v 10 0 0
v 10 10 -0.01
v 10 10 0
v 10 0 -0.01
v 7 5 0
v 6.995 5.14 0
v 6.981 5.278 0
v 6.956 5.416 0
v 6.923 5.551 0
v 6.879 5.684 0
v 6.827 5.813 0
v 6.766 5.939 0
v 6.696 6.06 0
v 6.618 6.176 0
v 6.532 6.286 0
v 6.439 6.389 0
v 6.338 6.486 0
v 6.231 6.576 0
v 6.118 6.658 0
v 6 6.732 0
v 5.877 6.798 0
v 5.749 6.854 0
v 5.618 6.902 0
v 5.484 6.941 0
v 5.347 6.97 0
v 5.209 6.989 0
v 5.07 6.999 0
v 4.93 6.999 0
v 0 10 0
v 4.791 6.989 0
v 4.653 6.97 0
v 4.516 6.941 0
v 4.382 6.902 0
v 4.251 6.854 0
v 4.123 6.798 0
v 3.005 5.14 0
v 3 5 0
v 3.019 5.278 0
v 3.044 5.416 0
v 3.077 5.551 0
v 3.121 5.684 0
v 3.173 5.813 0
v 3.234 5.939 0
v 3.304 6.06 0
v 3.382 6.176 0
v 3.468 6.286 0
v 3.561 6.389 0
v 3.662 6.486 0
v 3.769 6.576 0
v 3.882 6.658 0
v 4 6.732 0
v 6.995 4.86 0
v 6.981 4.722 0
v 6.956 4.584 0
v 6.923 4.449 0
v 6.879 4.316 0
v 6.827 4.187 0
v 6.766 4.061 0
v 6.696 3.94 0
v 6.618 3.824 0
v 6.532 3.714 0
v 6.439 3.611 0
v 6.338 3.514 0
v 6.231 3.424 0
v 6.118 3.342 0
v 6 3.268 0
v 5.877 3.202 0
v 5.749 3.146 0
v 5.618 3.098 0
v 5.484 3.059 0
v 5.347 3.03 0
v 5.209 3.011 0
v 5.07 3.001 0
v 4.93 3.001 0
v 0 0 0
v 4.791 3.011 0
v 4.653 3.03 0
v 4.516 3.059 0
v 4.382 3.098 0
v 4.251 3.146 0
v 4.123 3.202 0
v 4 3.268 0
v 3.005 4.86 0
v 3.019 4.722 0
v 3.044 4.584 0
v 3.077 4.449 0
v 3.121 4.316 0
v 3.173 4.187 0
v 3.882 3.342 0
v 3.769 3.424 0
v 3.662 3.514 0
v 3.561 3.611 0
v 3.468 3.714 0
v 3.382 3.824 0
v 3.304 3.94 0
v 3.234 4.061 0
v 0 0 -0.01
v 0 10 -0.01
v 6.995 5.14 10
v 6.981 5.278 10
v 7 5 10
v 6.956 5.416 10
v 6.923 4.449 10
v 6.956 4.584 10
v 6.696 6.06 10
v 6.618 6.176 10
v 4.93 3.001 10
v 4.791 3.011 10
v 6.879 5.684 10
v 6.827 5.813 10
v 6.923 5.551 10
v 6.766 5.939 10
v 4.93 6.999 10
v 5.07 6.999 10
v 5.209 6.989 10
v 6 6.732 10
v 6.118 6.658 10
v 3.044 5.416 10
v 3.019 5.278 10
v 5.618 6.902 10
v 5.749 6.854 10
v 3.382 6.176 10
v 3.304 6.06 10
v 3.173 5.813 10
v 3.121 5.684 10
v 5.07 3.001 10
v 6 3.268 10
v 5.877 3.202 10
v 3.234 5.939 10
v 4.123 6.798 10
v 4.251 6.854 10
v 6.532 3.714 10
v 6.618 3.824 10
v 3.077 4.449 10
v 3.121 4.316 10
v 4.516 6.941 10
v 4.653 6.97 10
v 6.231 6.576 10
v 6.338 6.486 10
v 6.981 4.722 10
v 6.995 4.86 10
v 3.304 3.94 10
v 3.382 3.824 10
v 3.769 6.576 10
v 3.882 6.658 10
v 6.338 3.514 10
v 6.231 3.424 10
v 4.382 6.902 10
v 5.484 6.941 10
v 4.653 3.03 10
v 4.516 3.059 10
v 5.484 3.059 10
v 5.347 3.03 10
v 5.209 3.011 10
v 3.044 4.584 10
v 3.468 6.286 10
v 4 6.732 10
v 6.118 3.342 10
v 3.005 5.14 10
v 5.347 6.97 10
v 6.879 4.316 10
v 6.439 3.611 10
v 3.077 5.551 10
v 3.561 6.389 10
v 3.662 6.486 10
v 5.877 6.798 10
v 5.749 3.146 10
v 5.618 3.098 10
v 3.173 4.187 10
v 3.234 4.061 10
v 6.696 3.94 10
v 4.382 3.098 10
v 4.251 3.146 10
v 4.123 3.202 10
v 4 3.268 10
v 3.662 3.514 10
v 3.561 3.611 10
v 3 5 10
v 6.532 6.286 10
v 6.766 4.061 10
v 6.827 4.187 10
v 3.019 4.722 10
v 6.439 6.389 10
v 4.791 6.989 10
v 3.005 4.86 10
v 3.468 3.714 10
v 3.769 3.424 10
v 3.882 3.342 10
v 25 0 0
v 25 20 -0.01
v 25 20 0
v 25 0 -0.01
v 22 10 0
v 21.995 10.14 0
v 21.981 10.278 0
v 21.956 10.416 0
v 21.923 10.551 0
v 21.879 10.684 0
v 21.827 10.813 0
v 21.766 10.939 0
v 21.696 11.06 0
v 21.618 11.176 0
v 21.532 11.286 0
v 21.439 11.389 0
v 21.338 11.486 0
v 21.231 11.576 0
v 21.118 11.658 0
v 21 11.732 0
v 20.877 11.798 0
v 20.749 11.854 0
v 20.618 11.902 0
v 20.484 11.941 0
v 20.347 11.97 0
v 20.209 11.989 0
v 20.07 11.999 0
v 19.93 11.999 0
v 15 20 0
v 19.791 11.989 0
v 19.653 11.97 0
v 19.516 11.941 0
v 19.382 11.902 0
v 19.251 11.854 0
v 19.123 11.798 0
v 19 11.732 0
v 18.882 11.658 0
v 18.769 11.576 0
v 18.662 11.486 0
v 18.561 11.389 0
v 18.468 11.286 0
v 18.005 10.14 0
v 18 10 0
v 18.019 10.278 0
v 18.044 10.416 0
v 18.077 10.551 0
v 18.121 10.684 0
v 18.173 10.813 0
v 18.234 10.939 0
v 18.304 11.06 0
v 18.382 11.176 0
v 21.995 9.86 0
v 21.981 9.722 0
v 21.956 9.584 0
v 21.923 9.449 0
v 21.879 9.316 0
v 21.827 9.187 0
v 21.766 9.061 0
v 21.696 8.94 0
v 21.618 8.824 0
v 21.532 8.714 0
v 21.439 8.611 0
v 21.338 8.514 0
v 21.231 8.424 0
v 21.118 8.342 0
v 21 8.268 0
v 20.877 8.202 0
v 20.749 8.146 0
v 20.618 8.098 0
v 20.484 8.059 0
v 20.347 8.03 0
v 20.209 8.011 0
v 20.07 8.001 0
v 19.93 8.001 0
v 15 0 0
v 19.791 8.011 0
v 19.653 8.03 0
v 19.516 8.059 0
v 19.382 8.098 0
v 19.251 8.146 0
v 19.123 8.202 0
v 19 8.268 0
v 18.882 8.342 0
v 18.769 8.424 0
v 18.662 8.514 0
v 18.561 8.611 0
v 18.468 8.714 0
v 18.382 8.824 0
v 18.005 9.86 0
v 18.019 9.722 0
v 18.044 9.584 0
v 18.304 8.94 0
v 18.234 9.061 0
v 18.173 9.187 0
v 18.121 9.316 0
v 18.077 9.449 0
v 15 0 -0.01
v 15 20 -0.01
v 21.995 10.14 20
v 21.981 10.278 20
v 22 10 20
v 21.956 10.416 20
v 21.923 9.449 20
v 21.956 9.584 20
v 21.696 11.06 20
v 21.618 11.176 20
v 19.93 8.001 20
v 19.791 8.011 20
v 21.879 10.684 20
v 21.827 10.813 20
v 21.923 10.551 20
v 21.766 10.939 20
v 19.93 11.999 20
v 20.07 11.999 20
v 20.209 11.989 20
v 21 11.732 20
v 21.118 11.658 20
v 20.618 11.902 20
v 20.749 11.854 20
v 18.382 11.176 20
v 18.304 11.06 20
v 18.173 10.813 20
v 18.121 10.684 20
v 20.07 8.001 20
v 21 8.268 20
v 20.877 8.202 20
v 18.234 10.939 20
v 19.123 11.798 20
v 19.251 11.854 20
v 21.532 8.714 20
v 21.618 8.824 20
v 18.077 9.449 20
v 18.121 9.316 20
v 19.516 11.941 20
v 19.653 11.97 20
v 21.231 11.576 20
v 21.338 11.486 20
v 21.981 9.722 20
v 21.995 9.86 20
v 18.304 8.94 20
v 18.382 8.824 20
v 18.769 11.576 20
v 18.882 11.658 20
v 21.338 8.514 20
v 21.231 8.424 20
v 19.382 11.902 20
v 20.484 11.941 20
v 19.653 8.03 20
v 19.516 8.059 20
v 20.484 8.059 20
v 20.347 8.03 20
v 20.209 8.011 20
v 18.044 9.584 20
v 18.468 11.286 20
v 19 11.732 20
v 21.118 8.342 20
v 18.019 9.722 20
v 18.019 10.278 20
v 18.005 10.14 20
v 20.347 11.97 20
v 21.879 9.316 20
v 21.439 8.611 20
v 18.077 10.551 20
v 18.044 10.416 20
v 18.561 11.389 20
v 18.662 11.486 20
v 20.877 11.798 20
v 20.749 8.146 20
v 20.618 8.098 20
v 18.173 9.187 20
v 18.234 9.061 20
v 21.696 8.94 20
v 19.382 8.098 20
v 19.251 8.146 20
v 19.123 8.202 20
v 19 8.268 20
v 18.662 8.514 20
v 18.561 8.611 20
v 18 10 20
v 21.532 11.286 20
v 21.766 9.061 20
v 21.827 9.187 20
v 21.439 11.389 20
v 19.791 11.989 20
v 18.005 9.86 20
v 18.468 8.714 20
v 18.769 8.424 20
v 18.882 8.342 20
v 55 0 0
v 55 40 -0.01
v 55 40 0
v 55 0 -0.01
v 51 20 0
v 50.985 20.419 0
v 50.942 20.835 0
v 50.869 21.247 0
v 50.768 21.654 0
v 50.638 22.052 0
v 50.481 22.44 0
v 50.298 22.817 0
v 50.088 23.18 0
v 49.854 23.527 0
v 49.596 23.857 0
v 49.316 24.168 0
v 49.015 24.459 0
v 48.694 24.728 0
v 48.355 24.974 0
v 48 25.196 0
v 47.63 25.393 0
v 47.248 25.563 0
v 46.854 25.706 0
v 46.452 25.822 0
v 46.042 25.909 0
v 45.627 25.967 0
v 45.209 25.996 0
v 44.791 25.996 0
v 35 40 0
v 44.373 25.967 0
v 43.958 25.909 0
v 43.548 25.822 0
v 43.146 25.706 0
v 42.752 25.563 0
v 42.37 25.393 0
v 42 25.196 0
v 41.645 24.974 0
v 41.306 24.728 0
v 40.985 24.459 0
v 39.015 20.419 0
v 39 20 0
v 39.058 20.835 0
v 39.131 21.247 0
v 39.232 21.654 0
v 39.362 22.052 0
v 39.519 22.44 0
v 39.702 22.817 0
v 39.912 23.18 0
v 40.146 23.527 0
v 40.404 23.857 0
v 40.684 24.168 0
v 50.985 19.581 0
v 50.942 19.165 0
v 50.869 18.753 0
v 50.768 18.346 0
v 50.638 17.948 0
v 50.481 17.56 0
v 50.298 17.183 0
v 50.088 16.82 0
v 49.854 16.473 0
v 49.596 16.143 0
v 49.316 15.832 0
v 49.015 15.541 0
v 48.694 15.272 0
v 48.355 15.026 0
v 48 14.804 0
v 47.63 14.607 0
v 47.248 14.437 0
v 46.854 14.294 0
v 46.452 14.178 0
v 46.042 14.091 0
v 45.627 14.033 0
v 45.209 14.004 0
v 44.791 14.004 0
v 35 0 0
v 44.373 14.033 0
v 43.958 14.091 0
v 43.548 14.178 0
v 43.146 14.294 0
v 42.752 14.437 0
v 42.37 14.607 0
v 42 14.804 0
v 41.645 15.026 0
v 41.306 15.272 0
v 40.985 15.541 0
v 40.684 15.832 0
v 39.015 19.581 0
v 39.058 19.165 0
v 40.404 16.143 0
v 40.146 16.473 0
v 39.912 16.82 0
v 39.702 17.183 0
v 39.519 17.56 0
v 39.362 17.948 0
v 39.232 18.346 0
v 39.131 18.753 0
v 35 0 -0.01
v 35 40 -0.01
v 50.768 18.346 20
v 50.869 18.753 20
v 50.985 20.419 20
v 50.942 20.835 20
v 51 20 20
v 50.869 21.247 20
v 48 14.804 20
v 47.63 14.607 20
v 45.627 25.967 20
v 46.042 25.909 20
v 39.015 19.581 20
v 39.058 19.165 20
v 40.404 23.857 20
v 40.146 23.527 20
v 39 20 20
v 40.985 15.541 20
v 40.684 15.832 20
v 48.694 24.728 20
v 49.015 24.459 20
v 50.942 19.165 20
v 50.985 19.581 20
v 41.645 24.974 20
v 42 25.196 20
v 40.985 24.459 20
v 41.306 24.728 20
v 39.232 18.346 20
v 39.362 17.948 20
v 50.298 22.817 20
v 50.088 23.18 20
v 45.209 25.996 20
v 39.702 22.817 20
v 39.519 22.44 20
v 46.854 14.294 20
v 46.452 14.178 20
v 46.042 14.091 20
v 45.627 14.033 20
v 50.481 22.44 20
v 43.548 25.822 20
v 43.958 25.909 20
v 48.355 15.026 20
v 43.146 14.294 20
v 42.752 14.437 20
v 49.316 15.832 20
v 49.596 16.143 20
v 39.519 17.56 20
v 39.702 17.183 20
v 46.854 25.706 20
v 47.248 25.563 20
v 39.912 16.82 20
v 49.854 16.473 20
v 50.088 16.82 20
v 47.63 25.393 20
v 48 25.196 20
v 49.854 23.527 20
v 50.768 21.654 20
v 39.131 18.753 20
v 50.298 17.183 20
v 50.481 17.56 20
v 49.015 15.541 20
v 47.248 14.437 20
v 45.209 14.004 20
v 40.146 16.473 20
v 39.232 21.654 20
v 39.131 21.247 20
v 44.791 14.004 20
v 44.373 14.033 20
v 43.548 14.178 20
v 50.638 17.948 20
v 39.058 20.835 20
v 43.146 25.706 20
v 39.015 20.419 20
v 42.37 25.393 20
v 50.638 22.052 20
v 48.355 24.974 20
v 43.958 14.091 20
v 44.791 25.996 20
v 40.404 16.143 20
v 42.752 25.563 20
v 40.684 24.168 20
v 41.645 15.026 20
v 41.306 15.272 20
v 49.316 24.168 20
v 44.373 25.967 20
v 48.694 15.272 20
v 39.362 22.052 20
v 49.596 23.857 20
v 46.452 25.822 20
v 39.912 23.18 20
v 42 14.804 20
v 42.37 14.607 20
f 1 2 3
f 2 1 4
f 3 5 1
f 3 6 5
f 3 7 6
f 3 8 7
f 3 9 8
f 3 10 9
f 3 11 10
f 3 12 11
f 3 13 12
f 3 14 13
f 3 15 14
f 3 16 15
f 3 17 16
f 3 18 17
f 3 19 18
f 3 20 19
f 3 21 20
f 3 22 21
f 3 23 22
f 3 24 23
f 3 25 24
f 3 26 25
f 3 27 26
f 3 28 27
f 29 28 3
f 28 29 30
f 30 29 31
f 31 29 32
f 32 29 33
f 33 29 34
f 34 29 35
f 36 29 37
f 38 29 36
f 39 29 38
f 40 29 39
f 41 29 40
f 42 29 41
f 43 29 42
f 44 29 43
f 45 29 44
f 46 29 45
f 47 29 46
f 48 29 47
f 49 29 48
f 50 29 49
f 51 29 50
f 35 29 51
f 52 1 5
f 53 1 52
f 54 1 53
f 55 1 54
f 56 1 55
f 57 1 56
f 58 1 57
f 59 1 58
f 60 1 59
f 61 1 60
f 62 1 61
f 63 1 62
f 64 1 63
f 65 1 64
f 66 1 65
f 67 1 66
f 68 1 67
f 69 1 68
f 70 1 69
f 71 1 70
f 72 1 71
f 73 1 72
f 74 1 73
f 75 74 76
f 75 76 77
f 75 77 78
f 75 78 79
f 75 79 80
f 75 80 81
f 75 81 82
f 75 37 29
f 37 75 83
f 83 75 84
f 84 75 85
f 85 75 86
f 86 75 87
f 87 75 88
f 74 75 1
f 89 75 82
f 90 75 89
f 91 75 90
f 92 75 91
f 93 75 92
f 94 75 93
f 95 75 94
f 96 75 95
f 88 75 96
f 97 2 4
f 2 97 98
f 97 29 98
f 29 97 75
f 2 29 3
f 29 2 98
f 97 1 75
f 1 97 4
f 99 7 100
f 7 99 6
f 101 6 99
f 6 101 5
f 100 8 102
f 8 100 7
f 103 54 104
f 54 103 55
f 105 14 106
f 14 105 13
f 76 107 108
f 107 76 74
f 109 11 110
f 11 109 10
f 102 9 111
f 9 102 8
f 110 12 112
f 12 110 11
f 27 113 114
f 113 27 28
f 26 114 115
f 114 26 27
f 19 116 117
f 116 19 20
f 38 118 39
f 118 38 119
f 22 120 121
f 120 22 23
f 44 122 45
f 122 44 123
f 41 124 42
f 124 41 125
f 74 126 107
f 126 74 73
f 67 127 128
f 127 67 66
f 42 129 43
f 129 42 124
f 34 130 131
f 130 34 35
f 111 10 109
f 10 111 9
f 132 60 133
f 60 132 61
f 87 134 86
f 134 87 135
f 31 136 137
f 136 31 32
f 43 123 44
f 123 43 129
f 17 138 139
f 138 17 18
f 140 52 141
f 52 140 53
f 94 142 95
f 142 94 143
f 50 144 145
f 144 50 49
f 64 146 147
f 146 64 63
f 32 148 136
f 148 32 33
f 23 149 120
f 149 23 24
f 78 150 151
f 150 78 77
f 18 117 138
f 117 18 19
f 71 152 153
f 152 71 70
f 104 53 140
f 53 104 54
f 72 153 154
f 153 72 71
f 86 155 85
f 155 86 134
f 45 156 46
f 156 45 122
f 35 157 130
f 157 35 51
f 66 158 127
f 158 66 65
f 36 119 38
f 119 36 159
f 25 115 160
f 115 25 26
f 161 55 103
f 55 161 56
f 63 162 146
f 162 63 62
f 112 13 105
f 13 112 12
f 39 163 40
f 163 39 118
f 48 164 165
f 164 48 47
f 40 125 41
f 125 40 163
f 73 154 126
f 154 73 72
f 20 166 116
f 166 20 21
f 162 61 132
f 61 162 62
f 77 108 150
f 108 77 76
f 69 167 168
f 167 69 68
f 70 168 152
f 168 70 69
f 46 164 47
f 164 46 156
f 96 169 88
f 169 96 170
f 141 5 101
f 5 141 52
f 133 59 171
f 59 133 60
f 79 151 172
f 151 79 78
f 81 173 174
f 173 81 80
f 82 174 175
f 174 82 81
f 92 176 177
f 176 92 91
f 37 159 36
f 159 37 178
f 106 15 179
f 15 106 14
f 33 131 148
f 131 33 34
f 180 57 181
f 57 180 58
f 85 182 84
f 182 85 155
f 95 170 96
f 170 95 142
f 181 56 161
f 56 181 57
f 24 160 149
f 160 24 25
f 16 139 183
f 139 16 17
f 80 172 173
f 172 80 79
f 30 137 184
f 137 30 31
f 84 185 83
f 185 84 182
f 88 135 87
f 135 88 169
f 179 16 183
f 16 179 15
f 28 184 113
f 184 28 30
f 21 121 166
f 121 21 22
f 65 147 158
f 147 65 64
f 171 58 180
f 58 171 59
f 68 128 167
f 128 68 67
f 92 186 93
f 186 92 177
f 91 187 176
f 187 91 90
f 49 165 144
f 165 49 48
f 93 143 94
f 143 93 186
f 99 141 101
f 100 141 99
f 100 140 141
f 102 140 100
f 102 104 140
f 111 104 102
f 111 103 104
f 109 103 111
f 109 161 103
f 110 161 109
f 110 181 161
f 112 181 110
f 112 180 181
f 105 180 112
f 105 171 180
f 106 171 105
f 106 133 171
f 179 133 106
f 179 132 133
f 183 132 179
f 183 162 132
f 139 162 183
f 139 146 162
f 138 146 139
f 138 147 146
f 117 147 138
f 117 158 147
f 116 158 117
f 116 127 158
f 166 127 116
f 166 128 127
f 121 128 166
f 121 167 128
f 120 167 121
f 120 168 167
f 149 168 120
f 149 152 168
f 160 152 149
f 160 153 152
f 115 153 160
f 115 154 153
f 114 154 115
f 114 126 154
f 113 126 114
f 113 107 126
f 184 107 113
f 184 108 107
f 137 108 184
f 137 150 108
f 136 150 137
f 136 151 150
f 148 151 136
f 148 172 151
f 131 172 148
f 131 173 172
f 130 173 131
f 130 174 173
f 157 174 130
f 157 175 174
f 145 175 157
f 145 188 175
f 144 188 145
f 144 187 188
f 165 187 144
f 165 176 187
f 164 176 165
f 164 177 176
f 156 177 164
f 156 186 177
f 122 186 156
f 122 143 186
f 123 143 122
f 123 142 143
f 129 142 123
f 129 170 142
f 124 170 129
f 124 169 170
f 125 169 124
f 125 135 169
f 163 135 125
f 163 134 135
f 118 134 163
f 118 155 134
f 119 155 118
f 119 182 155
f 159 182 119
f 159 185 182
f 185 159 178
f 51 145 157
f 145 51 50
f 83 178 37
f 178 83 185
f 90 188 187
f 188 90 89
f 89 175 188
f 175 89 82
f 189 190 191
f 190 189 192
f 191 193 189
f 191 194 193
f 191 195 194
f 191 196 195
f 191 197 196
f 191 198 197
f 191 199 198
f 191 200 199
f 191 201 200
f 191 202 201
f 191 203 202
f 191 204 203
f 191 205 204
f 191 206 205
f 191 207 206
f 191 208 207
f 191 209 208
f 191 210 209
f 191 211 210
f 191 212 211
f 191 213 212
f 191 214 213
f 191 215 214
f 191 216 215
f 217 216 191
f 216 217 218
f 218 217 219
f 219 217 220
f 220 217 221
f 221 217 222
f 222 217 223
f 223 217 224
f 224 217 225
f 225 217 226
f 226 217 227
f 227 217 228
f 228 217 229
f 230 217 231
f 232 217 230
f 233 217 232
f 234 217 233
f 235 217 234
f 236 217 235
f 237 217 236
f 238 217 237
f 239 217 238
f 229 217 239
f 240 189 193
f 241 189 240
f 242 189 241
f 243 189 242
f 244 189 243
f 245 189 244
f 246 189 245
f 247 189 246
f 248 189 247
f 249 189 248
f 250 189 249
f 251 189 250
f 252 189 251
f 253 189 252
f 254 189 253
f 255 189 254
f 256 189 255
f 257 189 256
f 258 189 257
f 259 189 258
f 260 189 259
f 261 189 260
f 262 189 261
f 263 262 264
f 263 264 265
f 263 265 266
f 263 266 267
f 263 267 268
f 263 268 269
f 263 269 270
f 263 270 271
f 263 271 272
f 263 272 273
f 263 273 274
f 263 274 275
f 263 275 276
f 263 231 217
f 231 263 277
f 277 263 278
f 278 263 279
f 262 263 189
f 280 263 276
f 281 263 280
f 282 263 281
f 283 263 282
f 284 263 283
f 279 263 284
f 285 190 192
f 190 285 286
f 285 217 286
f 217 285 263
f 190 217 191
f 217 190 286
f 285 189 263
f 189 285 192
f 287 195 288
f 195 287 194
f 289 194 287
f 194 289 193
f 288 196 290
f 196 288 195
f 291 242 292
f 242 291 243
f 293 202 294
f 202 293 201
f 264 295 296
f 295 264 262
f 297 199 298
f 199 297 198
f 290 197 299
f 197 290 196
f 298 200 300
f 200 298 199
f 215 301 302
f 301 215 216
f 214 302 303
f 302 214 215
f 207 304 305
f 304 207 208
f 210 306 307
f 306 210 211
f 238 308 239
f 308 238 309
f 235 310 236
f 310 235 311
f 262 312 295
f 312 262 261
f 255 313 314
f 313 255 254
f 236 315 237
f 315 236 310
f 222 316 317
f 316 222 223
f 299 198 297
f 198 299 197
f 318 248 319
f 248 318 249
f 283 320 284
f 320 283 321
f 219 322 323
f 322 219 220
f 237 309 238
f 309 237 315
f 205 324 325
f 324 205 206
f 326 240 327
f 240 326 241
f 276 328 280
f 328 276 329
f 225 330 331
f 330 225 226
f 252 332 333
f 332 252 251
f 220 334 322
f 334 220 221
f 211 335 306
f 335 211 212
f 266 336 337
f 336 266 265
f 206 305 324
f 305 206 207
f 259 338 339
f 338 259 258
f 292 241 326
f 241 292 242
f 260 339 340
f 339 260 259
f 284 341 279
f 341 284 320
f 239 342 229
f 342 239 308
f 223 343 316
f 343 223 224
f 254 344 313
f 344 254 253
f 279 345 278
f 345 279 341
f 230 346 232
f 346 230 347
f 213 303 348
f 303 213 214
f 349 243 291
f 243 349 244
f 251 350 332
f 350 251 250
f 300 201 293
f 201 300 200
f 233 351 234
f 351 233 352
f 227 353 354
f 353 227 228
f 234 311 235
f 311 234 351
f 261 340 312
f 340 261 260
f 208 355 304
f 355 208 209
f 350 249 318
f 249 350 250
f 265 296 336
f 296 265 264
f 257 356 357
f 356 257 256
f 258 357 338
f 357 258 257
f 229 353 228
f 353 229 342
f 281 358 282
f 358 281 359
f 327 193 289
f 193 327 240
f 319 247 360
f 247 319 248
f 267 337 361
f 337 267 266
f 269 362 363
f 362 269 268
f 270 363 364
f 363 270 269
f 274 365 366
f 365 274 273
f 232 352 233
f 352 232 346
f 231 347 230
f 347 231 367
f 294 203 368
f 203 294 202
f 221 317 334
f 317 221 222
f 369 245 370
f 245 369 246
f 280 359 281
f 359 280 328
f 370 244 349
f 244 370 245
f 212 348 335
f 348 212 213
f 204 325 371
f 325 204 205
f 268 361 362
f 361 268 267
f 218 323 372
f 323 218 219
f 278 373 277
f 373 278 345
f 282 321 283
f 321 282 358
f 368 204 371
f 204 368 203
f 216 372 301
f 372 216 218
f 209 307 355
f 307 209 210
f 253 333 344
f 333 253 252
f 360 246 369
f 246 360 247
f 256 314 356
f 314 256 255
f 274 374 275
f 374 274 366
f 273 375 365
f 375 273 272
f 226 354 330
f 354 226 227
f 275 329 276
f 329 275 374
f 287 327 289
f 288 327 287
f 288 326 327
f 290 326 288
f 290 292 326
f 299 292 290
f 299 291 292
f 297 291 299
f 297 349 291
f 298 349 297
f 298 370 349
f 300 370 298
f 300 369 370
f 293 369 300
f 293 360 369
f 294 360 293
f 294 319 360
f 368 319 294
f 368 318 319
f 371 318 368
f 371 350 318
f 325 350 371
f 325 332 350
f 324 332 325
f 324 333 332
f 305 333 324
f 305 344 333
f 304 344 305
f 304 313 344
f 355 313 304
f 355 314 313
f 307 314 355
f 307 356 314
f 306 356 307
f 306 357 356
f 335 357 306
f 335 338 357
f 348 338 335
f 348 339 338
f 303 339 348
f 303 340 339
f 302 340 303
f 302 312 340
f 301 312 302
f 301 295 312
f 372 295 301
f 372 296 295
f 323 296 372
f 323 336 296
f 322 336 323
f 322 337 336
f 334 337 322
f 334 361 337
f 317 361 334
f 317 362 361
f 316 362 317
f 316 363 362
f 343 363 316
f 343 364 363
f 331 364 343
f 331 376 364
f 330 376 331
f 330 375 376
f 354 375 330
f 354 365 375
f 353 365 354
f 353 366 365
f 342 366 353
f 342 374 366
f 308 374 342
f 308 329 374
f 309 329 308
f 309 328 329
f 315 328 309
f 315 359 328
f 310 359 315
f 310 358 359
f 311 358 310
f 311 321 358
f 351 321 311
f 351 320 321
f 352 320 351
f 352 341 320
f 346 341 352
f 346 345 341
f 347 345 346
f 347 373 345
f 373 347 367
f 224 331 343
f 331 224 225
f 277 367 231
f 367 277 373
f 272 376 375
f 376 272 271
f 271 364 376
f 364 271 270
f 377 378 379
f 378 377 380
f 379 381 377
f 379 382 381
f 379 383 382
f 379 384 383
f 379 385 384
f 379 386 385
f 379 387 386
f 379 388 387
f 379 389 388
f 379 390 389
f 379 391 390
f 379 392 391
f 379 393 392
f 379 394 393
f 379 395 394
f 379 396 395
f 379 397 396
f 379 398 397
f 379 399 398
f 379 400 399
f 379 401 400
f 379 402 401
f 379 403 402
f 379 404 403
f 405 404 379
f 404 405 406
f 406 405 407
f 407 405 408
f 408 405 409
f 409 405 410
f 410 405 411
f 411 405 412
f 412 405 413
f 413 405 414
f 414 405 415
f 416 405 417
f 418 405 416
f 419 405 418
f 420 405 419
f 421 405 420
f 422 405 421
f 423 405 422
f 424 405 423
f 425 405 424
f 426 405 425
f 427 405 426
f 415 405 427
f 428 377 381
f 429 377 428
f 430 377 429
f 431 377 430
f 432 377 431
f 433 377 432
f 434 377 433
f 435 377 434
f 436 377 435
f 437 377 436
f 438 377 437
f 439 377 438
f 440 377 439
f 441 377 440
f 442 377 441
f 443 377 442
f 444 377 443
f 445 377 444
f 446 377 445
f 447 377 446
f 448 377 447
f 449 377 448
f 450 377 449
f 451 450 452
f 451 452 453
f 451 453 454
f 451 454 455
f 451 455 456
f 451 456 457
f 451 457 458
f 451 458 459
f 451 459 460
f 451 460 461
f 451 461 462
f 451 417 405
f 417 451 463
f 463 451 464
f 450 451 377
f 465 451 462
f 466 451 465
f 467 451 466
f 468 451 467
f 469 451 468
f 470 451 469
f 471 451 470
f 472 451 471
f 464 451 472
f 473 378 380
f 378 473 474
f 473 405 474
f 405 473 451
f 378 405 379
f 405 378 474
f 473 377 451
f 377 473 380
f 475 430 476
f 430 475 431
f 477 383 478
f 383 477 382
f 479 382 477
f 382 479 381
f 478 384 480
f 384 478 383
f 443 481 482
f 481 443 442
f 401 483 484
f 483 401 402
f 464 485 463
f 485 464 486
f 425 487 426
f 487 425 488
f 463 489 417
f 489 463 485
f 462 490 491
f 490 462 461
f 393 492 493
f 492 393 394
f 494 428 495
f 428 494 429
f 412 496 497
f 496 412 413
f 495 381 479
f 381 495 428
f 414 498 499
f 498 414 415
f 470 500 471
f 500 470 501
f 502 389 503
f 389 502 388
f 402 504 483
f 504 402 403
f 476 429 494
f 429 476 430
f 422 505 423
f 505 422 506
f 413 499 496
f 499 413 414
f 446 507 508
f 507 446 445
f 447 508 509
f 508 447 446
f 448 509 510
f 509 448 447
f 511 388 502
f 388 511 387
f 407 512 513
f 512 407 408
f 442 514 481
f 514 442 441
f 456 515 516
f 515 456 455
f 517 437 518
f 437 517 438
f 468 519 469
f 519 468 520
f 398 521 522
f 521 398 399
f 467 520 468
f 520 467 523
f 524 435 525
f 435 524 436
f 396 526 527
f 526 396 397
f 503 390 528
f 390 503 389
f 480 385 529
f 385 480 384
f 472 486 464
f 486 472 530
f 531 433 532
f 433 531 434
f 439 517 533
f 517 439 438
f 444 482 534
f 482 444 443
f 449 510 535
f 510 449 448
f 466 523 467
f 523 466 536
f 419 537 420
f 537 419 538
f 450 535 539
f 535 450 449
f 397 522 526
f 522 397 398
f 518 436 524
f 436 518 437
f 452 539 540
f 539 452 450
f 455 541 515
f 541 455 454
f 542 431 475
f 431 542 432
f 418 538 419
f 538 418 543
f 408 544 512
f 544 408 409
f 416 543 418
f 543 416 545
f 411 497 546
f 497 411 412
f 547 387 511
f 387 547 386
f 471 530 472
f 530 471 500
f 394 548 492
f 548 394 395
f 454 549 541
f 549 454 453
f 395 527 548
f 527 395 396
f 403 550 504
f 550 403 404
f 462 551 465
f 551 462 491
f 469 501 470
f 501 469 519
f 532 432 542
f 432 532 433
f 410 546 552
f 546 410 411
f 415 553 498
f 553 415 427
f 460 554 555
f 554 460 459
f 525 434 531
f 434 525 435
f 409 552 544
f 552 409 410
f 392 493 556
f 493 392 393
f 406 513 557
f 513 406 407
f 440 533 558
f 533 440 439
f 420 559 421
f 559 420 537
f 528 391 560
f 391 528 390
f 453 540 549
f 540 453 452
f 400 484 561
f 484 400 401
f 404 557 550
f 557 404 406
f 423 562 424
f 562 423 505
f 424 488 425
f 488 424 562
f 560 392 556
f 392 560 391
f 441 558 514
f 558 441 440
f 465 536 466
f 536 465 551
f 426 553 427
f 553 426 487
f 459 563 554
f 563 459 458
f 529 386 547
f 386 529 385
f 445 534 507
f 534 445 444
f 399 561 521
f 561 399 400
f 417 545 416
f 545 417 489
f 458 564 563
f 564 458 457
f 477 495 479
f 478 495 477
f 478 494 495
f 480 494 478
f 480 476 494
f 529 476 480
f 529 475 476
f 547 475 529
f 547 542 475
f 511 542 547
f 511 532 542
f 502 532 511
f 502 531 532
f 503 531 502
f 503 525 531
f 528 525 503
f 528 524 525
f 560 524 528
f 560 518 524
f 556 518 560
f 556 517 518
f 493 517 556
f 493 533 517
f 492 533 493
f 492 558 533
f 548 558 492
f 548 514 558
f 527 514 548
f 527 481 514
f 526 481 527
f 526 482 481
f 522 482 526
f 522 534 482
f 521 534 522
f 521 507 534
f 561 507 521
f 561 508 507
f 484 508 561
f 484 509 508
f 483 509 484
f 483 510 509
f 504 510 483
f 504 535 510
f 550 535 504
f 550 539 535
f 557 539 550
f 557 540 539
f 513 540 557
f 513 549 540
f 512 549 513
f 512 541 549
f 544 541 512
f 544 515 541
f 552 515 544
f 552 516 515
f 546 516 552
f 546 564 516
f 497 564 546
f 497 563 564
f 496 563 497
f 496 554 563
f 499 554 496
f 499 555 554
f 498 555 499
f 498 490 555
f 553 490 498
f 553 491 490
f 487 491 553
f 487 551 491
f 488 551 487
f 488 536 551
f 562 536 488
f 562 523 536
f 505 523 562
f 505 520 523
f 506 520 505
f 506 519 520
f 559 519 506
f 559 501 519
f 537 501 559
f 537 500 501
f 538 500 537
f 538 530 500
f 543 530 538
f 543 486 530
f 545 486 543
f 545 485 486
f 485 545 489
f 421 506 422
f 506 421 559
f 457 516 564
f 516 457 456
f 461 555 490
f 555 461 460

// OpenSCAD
// file: ../../Base/Boxes.scad
// Fischertechnik Box Foundation
// Pre-designed Boxes

use <Constants.scad>

include <PlacementOptions.scad>

box190Width = 190;
box190Depth = 130;
box130Width = 130;
box130Depth = 95;
boxUsageHeight = 33.9;
boxWallThickness = 2.4;
boxBaseThickness = 1.0;

// getBoxWallThickness()
// Gets the wall thickness of a Fischertechnik Box

function getBoxWallThickness() = boxWallThickness;

// Gets the usable height of a fischertechnik box
function getBoxUsageHeight() = boxUsageHeight;

// Gets the thickness of the Fischertechnik box base.
function getBoxBaseThickness() = boxBaseThickness;

// Gets the usable inner space of a Box 190 as an x/y-list
function getBox190Space() = [
    box190Width - 2*getBoxWallThickness(), 
    box190Depth - 2*getBoxWallThickness() ];

// Imports the Fischertechnik empty box 130x190 mm and places it at position 0,0
// 190x130 are the outer sizes, the inner space is slightly smaller. Use getBox190Space() to get the inner sizes.
// This module needs the STL file "Fischertechnik Box 130x190.stl" in the library path.
// The box is positioned that the usable inner space is at the 0,0,0 position. The

module Box190() {
    translate([-getBoxWallThickness(),-getBoxWallThickness(),-getBoxBaseThickness()])
        import("Fischertechnik Box 130x190.stl", convexity=3);
}

// Gets the usable inner space of a Box 130 as an x/y-list
function getBox130Space() = [
    box130Width - 2*getBoxWallThickness(), 
    box130Depth - 2*getBoxWallThickness() ];

// Imports the Fischertechnik empty box 95x130 mm and places it at position 0,0
// 190x130 are the outer sizes, the inner space is slightly smaller. Use getBox190Space() to get the inner sizes.
// This module needs the STL file "Fischertechnik Box 95x130.stl" in the library path.
// The box is positioned that the usable inner space is at the 0,0,0 position. The

module Box130() {
    translate([-getBoxWallThickness(),-getBoxWallThickness(),-getBoxBaseThickness()])
        import("Fischertechnik Box 95x130.stl", convexity=3);
}

// Creates a web at the specified box walls
// corner 0 = LowerLeft, 1 = UpperLeft, 2 = UpperRight, 3 = LowerRight
// side 0 = LeftOfCorner, 1 = RightOfCorner
// distance = Distance in mm from the corner
// box = inner width and depth of the box (default: Box 190)
// webWidth = length of the web (default is 3 mms)
// webThickness = thickness of the web (default is 1 mm)

module BoxWeb(corner, side, distance, box=getBox190Space(), webWidth=3, webThickness=1.0) {
    sink = getBoxWallThickness()/2;

    width = (corner % 2 == 0) ? 
            (side == LeftOfCorner ? webWidth : webThickness) :
            (side == LeftOfCorner ? webThickness : webWidth);

    depth = (corner % 2 == 0) ? 
            (side == RightOfCorner ? webWidth : webThickness) :
            (side == RightOfCorner ? webThickness : webWidth);
    
    xDiff = corner == LowerLeft ? 
                (side == LeftOfCorner ? -sink : distance) :
            (corner == UpperLeft ?                
                (side == LeftOfCorner ? distance : -sink) :
            (corner == UpperRight ?
                (side == LeftOfCorner ? box.x-webWidth+sink : box.x-distance-webThickness) :
                (side == LeftOfCorner ? box.x-distance-webThickness: box.x-webWidth+sink)));

    yDiff = corner == LowerLeft ? 
                (side == RightOfCorner ? -sink : distance) :
            (corner == UpperLeft ?
                (side == RightOfCorner ? box.y-distance : box.y-webWidth+sink) :
            (corner == UpperRight ?
                (side == RightOfCorner ? box.y-webWidth+sink : box.y-distance) :
                (side == RightOfCorner ? distance : -sink)));
    
    translate([xDiff, yDiff, -getExcess()])
        cube([width, depth, boxUsageHeight + 2*getExcess()]);
}
// file: ../../Base/Rotation.scad
// Fischertechnik Box Foundation
// Geometry Helpers Rotation

include <PlacementOptions.scad>

// getRotatedSpace(space, rotation=NoRotation)
// Rotates the space dependent on the specified rotation

function getRotatedSpace(space, rotation=NoRotation) = [
    (rotation == Rotate90 || rotation == Rotate270) ? space.y : space.x,
    (rotation == Rotate90 || rotation == Rotate270) ? space.x : space.y
];

// Rotates the given space around the fixed left lower corner
// space = the space the children needs as width/depth list [width,depth]
// rotation = 0 Rotate0 degrees, 1 Rotate90 degrees, 2 Rotate180 degrees, 3 Rotate270 degrees (equivalent to -90)

module RotateFix(space, rotation=Rotate0) {
    dy = (rotation == Rotate0 || rotation == Rotate270) ? 0 :
        (rotation == Rotate90) ? space.x :
        space.y;
    dx = (rotation < Rotate180) ? 0 :
        (rotation == Rotate180) ? space.x :
        space.y;
    
    translate([dx, dy, 0])
        rotate([0, 0, rotations[rotation]])
            children();
}
// file: ../../Base/Alignment.scad
// Fischertechnik Box Foundation
// Geometry Helpers Alignment

include <PlacementOptions.scad>

// getAlignedX(elementWidth, spaceWidth, align=AlignRight, offset=0)
// Gets the aligned X offset of an element with the given
// width in the given space.
// elementWidth = The width of the element to positon
// spaceWidth = The space where the element should be aligned
// align = 0 AlignLeft, 1 AlignCenter, 2 AlignRight
// offset = an optional offset from the aligned position. When
// aligned left or centered, then positive values are in X direction.
// When aligned right then positive values are in negative X direction.

function getAlignedX(elementWidth, spaceWidth, align=AlignRight, offset=0) =
    (align == AlignLeft) ?
        offset :
        ((align == AlignCenter) ?
        (spaceWidth - elementWidth)/2 + offset :
        spaceWidth - offset - elementWidth);

// getAlignedY(elementDepth, spaceDepth, align=AlignTop, offset=0)
// Gets the aligned Y offset of an element with the given
// depth in the given space.
// elementDepth = The depth of the element to positon
// spaceDepth = The space where the element should be aligned
// align = 0 AlignBottom, 1 AlignCenter, 2 AlignTop
// offset = an optional offset from the aligned position. When
// aligned bottom or centered, then positive values are in Y direction.
// When aligned top then positive values are in negative Y direction.

function getAlignedY(elementDepth, spaceDepth, align=AlignTop, offset=0) =
    (align == AlignBottom) ?
        offset :
        ((align == AlignCenter) ?
        (spaceDepth - elementDepth)/2 + offset :
        spaceDepth - offset - elementDepth);
// file: ../../Base/PlacementOptions.scad
// Fischertechnik Box Foundation
// Placement Options

// Alignment
NoAlign = 0;
AlignLeft = 1;
AlignBottom = 2;
AlignCenter = 3;
AlignRight = 4;
AlignTop = 5;

// Element rotation degree steps
rotations = [0, -90, -180, -270];

// Rotation
NoRotation = 0;
Rotate0 = 0;
Rotate90 = 1;
Rotate180 = 2;
Rotate270 = 3;

// Docking (seen from above)
NoDock = -1;
DockLeft = 0;
DockTop = 1;
DockRight = 2;
DockCorner = 2;
DockBottom = 3;

// Web corners
LowerLeft = 0;
UpperLeft = 1;
UpperRight = 2;
LowerRight = 3;

// Web position relative to corner
LeftOfCorner = 0;
RightOfCorner = 1;
// file: ../../Base/Placement.scad
// Fischertechnik Box Foundation
// Geometry Helpers Placement

use <Constants.scad>
use <Alignment.scad>
use <Rotation.scad>
use <Boxes.scad>

include <PlacementOptions.scad>

// Place(x=0, y=0, elementSpace=[0,0], alignX=AlignLeft, alignY=AlignBottom, rotation=Rotate0, boxSpace=getBox190Space())
// Places the child at the specified position
// y = Y-Position. This is a relative position when an X aligment is specified.
// x = X-Position. This is a relative position when an Y aligment is specified.
// elementSpace = space of the element to be placed [x,y]
// alignX = -1=NoAlign, 0 AlignLeft, 1 AlignCenter, 3 AlignRight (elementSpace and boxSpace required!)
// alignY = -1=NoAlign, 2 AlignBottom, 1 AlignCenter, 4 AlignTop (elementSpace and boxSpace required!)
// rotation = 0 Rotate0 0 degrees, 1 Rotate90 90 degrees, 
// 2 Rotate180 180 degrees, 3 Rotate270 270 degrees (equivalent to -90)
// boxSpace = Inner space of the box where the placement occurs [x,y] - default is Box 190x130 inner space

module Place(x=0, y=0, elementSpace=[0,0], 
  alignX=AlignLeft, alignY=AlignBottom, 
  rotation=NoRotation, boxSpace=getBox190Space()) {

    module Position(x, y, space, rotation=Rotate0) {
        translate([x, y, 0])
            RotateFix(space, rotation)
                children(0);
    }

    space = getRotatedSpace(elementSpace, rotation);
    alignedX = getAlignedX(space.x, boxSpace.x, alignX, x);
    alignedY = getAlignedY(space.y, boxSpace.y, alignY, y);
    Position(alignedX, alignedY, elementSpace, rotation)
        children(0);
}

// Center(space=getBox130Space(), elementSpace=[0,0])
// space = Space where the children is centered. For cylinder use centered=true and no elementSpace.
// elementSpace = space of the element to be centered [x,y]

module Center(space=getBox190Space(), elementSpace=[0,0]) {
    translate([(space.x - elementSpace.x) / 2, (space.y - elementSpace.y) / 2])
        children(0);
}

// CenterHorizontal(width=0, y=0, offset=0, space=getBox130Space())
// space = Space where the children is centered. For cylinder use centered=true and no elementSpace.
// elementSpace = space of the element to be centered [x,y]

module CenterHorizontal(width=0, y=0, offset=0, space=getBox190Space()) {
    translate([(space.x - width) / 2 + offset, y])
        children(0);
}

// CenterVertical(depth=0, x=0, offset=0, space=getBox130Space())
// space = Space where the children is centered. For cylinder use centered=true and no elementSpace.
// elementSpace = space of the element to be centered [x,y]

module CenterVerticalal(depth=0, x=0, offset=0, space=getBox190Space()) {
    translate([x, (space.y - depth) / 2 + offset])
        children(0);
}
// file: ../../Base/Constants.scad
// Fischertechnik Box Foundation
// Constants

// Constant values necessary for multiple elements

// Base constants
dividerThickness = 1.2;
excess = 0.01;
fragments = 90;
tolerance = 0.8;

// Gets the thickness of a divider 
function getDividerThickness() = dividerThickness;

// Gets the excess that is used to merge walls into each other
function getExcess() = excess;

// Gets amount of fragments of a cylinder
function getFragments() = fragments;

// Gets the inner tolerance of a frame to each side
function getTolerance() = tolerance;


// Fischertechnik specific constants
axisDiameter = 4;
axisBottomDiameter = axisDiameter + 1;
standardEdgeDistance = 2.5;
standardWebDistance = 11.5;
standardCornerLength = 15;
tubeWallFactor = 1.6;

// Gets axis diameter
function getAxisDiameter() = axisDiameter;

// Gets axis bottom diameter for thicker part at the bottom
function getAxisBottomDiameter() = axisBottomDiameter;

// gets the standard distance to the wall of the box for dockable frames with webs
function getStandardEdgeDistance() = standardEdgeDistance;

// gets the standard distance of each web to the corner of the dockable frame
function getStandardWebDistance() = standardWebDistance;

// gets the standard length of the corner walls of a dockable frame
function getStandardCornerLength() = standardCornerLength;

// gets the wall thickness of a tube.
function getTubeWallThickness() = tubeWallFactor * getDividerThickness();
// main file
// Fischertechnik Box Foundation
// ModelBase
// Test Axis with Space

use <../../Base/Constants.scad>
use <../../ModelBase/Simple.scad>

AxisWithSpace(10, [10, 10]);

translate([15, 0, 0])
    AxisWithSpace(20, [10,20]);

translate([35, 0, 0])
    AxisWithSpace(20, [20,40], 12);
